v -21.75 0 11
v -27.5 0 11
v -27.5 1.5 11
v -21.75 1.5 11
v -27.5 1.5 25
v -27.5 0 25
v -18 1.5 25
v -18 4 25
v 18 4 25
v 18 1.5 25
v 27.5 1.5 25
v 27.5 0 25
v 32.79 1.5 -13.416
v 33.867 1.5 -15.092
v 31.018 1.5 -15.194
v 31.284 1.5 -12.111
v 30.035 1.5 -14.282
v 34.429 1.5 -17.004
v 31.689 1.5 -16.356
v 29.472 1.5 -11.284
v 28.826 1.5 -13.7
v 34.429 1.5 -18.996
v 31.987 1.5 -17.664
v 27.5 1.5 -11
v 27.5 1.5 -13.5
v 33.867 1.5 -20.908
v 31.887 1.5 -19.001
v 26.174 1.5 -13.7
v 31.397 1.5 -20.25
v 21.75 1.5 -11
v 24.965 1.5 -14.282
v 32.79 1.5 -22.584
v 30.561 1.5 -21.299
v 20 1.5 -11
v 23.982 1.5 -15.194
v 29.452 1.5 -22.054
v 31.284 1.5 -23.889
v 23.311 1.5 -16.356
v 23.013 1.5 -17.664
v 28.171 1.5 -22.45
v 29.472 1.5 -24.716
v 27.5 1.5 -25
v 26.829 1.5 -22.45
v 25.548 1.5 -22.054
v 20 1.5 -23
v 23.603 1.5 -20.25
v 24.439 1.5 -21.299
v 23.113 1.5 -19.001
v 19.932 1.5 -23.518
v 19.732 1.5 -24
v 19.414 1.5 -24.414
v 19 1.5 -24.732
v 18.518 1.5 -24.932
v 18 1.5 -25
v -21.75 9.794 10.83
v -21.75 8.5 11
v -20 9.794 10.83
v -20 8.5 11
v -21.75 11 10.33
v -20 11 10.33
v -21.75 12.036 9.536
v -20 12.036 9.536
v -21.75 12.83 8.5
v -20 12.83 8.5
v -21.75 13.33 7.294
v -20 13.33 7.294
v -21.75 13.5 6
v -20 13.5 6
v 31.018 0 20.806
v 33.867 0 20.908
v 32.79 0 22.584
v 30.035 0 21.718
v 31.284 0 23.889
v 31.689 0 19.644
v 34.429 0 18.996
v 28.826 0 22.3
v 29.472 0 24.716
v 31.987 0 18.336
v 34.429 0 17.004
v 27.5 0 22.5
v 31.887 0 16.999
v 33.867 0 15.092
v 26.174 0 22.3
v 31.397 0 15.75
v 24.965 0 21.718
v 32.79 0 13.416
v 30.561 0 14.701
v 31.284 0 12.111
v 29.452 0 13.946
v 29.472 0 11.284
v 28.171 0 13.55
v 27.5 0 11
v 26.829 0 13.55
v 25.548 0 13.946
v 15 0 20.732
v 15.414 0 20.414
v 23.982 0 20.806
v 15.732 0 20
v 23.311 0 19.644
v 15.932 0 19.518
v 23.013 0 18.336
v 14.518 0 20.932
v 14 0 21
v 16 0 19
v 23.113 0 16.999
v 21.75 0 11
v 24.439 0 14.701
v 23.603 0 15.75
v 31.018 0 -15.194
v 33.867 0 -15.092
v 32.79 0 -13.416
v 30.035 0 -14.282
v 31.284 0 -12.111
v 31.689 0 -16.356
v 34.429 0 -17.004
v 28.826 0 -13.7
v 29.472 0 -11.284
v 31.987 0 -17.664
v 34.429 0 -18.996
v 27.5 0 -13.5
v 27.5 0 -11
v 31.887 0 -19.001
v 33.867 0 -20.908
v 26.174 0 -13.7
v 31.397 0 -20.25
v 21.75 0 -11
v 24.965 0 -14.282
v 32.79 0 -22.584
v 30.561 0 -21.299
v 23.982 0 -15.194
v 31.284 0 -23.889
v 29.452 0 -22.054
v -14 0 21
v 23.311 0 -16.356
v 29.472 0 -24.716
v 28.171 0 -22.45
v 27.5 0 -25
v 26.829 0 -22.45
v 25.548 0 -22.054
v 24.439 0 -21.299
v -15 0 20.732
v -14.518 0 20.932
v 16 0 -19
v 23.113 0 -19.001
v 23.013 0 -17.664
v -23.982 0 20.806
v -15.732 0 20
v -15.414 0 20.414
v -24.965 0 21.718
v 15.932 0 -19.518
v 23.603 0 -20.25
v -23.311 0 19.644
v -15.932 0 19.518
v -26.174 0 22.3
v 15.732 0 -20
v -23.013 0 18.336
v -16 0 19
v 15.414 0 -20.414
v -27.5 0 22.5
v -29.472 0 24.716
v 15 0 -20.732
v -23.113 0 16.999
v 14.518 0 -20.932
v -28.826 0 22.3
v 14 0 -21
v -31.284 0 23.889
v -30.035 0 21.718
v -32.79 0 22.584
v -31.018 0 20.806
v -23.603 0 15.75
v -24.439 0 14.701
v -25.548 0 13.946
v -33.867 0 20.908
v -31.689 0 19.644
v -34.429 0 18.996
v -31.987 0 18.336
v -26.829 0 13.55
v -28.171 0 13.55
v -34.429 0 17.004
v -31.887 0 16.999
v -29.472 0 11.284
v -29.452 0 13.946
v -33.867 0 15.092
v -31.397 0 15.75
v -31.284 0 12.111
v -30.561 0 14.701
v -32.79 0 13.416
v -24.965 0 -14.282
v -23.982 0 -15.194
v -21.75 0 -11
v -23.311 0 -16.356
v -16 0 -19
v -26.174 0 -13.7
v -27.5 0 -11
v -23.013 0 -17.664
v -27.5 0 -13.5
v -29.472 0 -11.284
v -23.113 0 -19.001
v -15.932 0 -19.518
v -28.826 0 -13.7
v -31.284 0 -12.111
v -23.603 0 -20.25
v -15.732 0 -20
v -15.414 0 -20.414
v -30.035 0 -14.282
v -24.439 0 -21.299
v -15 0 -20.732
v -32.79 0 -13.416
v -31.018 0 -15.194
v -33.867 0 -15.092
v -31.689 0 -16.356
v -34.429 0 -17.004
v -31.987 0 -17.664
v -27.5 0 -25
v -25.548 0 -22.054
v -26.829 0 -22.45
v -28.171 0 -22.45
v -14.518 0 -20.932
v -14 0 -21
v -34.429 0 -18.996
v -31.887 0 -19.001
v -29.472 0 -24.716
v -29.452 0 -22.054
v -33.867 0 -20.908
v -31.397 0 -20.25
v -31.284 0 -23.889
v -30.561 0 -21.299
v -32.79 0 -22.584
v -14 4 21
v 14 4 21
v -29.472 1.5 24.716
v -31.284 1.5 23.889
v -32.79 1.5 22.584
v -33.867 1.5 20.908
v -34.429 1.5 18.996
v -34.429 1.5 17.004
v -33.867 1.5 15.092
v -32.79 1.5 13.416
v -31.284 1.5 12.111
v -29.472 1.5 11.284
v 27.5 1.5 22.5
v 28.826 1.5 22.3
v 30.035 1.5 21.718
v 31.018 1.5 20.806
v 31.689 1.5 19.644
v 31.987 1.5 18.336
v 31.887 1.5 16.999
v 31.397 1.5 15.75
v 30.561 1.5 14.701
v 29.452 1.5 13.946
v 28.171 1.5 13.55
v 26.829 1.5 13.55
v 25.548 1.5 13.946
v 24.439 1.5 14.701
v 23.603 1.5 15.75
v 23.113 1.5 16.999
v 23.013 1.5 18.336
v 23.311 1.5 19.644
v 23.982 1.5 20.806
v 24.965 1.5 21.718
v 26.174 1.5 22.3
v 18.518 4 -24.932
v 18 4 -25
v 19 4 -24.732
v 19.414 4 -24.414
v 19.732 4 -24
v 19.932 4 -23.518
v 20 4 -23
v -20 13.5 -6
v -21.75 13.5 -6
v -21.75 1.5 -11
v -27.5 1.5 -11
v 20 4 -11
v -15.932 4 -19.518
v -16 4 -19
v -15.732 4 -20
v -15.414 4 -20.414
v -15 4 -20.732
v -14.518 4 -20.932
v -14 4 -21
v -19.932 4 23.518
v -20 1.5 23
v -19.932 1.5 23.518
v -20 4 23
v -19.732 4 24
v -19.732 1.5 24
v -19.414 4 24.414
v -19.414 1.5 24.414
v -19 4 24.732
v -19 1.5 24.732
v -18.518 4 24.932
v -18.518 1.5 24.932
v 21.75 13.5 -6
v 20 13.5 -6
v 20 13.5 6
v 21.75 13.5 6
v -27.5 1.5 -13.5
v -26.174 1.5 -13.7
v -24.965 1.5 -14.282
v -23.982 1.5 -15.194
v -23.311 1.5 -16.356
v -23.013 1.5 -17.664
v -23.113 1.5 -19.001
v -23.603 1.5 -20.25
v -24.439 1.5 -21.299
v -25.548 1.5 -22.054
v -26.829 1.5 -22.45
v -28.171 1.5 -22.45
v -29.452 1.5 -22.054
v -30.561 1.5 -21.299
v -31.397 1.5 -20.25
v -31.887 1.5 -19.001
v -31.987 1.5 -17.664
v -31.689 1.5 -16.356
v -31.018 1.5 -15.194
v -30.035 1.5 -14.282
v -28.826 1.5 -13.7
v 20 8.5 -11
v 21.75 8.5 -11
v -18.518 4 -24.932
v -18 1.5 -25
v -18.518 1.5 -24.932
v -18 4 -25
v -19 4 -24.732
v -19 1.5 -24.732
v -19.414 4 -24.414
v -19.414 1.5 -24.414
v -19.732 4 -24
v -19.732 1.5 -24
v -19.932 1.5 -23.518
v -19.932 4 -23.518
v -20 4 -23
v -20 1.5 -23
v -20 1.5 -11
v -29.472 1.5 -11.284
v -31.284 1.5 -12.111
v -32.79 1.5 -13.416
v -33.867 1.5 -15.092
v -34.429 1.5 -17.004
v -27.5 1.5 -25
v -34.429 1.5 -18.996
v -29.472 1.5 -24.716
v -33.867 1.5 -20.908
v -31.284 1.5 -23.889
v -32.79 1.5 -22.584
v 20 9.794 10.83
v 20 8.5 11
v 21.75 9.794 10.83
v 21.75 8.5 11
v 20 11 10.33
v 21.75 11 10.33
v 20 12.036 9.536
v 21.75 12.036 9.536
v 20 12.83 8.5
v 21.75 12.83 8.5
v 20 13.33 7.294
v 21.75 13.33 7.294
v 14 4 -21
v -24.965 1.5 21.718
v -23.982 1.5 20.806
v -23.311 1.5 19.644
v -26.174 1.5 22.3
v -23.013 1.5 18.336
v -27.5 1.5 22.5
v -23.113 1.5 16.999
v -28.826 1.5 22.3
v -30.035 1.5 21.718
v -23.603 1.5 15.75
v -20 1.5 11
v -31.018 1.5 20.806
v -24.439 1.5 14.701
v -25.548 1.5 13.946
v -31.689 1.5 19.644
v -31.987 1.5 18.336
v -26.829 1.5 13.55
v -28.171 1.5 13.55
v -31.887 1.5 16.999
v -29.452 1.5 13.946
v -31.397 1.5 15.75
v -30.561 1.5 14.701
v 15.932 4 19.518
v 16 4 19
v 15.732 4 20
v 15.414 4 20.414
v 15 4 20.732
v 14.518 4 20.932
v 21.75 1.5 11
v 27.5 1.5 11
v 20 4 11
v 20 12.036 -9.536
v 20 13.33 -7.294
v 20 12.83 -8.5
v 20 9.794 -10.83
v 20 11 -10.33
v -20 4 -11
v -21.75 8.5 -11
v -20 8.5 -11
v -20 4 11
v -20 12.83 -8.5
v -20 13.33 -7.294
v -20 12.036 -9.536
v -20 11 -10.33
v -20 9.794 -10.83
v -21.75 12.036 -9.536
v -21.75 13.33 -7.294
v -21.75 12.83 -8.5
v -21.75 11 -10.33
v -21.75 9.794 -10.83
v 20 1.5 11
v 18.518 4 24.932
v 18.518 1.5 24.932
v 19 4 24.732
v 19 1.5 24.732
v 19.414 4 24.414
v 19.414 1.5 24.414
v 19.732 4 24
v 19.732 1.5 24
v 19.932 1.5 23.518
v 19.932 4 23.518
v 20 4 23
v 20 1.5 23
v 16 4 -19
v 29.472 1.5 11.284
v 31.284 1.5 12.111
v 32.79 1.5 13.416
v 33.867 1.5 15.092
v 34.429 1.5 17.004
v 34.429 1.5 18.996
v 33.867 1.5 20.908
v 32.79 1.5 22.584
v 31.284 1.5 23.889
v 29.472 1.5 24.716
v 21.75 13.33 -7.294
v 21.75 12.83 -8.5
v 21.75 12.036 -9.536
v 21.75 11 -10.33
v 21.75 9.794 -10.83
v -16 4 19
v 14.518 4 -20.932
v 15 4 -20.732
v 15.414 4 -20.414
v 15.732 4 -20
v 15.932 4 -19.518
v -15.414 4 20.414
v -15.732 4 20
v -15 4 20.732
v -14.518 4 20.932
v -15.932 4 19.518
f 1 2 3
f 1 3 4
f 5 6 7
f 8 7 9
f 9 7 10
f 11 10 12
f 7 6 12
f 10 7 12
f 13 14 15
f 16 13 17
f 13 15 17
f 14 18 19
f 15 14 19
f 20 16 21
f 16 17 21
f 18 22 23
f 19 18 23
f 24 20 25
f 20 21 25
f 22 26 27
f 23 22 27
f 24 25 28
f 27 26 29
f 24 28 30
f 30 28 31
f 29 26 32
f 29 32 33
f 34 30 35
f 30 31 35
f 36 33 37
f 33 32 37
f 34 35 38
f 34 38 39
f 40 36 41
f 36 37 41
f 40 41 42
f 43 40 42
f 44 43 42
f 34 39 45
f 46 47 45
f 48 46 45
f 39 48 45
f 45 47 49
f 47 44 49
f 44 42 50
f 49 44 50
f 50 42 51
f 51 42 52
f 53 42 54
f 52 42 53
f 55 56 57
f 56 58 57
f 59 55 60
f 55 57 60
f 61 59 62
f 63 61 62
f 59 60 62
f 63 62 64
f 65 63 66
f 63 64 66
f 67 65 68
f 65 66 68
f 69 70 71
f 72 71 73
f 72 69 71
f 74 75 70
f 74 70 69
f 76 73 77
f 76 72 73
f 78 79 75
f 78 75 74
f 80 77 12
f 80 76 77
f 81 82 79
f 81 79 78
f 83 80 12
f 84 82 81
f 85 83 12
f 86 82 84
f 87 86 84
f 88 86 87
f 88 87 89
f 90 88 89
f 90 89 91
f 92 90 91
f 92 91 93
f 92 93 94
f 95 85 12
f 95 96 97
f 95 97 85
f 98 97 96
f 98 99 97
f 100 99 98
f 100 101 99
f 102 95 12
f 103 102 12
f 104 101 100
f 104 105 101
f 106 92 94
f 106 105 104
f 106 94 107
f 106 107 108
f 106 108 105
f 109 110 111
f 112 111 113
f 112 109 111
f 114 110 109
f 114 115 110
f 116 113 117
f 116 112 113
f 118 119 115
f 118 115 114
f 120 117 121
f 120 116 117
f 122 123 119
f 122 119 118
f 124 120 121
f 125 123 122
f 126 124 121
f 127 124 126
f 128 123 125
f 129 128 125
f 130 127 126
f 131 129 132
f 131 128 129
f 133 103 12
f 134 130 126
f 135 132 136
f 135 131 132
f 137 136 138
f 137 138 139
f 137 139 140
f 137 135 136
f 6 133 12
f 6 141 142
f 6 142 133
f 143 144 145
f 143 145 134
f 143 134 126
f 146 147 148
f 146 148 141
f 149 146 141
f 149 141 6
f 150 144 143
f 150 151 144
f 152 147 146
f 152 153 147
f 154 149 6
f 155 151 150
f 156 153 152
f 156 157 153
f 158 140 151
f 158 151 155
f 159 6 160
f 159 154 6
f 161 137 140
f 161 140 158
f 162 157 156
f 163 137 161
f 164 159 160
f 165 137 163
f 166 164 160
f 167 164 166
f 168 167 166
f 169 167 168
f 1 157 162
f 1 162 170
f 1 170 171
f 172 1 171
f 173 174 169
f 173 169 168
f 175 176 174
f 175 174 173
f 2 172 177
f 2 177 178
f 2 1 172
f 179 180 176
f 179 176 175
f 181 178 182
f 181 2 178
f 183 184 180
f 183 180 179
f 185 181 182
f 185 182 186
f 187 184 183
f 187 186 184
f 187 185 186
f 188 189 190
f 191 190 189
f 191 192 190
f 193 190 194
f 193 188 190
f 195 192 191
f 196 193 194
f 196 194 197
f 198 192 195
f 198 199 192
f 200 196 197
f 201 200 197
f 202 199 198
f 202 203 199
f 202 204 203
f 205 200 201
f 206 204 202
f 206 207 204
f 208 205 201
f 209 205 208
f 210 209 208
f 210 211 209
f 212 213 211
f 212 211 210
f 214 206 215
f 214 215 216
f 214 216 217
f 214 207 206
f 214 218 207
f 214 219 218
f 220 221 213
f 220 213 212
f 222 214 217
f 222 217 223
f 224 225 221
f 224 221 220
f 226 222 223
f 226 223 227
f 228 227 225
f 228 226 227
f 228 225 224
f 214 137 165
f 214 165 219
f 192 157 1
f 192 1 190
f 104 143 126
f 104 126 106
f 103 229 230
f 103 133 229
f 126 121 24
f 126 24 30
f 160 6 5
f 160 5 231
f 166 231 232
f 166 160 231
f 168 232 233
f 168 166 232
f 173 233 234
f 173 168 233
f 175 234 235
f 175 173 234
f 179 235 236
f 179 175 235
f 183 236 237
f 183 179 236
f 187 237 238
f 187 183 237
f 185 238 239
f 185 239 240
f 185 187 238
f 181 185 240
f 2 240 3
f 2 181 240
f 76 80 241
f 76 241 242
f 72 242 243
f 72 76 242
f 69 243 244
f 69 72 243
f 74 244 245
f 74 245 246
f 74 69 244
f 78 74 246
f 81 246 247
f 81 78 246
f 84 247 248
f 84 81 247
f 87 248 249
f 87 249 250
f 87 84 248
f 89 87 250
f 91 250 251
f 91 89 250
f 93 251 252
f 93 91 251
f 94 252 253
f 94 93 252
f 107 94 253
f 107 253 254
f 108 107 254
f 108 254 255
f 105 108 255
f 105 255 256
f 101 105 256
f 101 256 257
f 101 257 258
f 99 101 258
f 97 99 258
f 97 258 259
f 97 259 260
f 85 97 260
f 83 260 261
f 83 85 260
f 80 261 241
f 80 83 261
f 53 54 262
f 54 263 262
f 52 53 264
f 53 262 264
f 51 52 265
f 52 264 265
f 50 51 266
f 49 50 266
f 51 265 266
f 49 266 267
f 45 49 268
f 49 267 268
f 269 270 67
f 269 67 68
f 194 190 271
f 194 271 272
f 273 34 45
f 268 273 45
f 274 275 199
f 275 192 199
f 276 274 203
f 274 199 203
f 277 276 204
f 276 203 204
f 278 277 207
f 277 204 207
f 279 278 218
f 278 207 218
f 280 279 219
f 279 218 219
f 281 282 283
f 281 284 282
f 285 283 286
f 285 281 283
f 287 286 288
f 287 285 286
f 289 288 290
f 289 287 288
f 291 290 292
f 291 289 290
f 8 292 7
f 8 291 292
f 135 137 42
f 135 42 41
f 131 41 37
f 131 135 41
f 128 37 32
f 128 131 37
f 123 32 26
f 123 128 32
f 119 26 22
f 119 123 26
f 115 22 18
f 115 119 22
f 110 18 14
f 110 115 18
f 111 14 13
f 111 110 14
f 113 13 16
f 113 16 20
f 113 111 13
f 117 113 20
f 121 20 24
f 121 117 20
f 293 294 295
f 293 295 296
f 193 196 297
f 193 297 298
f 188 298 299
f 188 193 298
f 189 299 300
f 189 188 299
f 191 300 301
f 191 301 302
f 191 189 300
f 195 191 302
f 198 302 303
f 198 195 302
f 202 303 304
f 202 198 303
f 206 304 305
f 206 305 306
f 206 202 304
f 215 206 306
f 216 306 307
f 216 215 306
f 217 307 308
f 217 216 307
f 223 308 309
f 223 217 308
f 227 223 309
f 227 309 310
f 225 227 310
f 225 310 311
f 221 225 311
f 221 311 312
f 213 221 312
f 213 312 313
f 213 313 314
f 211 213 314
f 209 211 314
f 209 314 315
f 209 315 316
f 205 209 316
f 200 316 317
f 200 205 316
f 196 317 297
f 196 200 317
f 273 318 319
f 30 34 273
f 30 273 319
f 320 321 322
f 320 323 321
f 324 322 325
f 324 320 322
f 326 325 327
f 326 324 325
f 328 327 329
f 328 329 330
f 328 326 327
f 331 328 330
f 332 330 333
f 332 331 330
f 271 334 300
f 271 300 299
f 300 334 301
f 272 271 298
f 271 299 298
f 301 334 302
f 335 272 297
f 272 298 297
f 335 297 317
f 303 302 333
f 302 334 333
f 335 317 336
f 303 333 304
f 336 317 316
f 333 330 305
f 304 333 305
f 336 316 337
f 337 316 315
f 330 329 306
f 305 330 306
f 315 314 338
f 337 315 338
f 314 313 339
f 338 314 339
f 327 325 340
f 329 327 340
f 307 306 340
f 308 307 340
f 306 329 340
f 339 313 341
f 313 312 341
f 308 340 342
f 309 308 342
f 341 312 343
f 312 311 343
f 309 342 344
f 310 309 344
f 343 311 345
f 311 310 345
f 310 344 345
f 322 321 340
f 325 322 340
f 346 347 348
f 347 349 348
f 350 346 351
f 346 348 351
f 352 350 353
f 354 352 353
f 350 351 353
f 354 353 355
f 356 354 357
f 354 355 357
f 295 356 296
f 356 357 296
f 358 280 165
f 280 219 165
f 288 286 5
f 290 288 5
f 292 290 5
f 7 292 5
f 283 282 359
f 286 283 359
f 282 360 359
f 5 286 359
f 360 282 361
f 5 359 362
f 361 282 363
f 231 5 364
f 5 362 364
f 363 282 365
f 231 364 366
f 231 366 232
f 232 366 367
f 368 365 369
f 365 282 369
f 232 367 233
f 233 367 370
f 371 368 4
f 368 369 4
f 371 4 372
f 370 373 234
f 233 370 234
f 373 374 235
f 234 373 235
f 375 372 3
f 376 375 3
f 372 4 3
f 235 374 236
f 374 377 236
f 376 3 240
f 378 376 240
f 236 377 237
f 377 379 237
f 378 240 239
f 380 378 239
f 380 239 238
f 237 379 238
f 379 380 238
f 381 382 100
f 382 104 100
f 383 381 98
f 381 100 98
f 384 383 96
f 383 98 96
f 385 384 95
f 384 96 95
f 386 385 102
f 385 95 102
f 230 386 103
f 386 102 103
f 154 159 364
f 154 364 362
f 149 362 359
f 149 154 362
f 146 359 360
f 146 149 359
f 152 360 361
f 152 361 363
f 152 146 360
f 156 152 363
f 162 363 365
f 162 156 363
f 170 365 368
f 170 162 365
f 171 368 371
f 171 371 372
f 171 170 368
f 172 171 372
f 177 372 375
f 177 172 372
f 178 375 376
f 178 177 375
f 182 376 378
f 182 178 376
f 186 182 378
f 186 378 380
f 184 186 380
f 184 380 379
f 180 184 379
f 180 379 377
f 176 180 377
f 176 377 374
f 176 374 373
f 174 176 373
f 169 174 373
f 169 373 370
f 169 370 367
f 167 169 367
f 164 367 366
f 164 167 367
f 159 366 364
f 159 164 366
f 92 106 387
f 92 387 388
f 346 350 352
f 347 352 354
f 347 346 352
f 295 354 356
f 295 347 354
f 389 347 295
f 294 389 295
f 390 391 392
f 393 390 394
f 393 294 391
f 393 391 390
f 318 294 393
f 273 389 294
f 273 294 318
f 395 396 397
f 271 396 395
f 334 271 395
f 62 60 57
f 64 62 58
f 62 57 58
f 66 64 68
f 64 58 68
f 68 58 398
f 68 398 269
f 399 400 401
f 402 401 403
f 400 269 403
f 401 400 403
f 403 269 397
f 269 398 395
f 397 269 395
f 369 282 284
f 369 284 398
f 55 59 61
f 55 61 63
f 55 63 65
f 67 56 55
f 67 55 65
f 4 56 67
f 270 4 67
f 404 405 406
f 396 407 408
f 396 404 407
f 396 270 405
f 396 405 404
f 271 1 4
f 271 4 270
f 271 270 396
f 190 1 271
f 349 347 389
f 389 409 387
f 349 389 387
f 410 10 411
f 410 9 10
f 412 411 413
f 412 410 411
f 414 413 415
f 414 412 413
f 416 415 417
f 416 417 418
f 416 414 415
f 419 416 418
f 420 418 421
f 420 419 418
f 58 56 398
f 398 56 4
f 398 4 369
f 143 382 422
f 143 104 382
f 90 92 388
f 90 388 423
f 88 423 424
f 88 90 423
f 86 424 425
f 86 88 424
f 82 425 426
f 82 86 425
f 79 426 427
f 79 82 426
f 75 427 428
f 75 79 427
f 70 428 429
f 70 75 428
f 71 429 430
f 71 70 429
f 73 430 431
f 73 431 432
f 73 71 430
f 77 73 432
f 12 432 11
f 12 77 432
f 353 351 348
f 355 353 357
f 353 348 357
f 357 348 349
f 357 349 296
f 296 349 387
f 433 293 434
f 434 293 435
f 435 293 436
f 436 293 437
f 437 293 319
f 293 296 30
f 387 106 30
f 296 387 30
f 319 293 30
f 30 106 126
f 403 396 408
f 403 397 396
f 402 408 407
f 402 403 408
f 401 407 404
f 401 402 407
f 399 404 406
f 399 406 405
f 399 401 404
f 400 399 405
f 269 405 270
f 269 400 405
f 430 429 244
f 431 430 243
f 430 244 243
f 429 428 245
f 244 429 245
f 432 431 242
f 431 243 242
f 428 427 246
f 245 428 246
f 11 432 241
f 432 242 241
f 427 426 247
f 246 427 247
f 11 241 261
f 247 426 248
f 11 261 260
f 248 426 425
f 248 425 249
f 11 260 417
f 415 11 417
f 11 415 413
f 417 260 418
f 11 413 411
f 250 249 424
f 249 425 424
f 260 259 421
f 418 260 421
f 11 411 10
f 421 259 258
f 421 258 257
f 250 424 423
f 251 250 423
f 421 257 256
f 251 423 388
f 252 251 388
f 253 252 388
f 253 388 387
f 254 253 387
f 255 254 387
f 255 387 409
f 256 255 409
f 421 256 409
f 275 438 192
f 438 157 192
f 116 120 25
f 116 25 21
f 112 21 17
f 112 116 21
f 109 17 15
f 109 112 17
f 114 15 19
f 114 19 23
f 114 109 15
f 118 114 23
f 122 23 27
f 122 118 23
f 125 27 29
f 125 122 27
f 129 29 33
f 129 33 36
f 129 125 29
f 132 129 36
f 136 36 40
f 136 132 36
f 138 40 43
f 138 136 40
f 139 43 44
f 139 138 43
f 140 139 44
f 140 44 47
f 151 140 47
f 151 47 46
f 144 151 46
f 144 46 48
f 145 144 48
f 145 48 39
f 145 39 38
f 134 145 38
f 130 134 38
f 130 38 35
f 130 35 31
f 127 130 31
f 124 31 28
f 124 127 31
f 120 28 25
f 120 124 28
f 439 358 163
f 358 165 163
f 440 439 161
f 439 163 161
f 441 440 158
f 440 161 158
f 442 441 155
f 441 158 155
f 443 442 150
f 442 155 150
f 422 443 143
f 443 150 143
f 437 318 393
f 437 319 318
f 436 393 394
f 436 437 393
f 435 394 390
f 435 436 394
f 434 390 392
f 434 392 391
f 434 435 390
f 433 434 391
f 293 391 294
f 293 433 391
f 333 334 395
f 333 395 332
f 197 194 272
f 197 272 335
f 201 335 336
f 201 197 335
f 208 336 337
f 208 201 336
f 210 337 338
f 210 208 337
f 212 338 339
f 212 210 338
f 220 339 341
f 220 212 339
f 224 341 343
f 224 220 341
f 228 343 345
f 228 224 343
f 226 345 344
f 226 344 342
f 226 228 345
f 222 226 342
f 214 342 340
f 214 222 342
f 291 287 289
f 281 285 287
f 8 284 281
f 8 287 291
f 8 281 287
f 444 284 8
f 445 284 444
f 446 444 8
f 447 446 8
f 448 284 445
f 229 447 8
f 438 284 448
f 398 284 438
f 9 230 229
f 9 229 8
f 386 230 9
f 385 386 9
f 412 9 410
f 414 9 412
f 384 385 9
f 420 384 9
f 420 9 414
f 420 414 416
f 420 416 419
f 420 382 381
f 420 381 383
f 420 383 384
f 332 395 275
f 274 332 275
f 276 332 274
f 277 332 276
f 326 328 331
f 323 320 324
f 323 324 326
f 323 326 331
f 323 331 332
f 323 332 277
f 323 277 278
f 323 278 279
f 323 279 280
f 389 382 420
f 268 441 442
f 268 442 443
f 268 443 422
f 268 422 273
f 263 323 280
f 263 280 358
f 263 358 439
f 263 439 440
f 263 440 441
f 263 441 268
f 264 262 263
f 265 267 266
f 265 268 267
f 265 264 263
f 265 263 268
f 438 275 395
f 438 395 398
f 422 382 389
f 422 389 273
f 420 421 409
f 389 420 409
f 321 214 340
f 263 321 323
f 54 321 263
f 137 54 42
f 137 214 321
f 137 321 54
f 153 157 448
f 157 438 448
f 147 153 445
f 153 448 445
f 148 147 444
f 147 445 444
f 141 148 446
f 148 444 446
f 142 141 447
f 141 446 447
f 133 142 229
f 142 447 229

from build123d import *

# Parameters (mm, degrees)
SKETCH1_R               = 4.5
BOSS_EXTRUDE1_DEPTH     = 1.5
SKETCH2_W               = 1.75
SKETCH2_H               = 22
BOSS_EXTRUDE2_DEPTH     = 12
SKETCH3_W               = 40
SKETCH3_H               = 50
SKETCH3_W_2             = 32
SKETCH3_H_2             = 42
BOSS_EXTRUDE3_DEPTH     = 2.5
CUT_EXTRUDE1_DEPTH      = 45.263416045
CUT_EXTRUDE1_DEPTH_BACK = 45.263416045
SKETCH3_2_W             = 32
SKETCH3_2_H             = 42
FILLET1_R               = 2
FILLET2_R               = 2
FILLET3_R               = 5


with BuildPart() as part:
    # Sketch1 → Boss-Extrude1 (new body)
    with BuildSketch(Plane(origin=(0, 0, 0), x_dir=(1, 0, 0), z_dir=(0, 1, 0))):
        with BuildLine():
            Line((27.5, 25), (-27.5, 25))
            ThreePointArc((-27.5, 25), (-34.5, 18), (-27.5, 11))
            Line((-27.5, 11), (-21.75, 11))
            Line((-21.75, 11), (-21.75, -11))
            Line((-21.75, -11), (-27.5, -11))
            ThreePointArc((-27.5, -11), (-34.5, -18), (-27.5, -25))
            Line((-27.5, -25), (27.5, -25))
            ThreePointArc((27.5, -25), (34.5, -18), (27.5, -11))
            Line((27.5, -11), (21.75, -11))
            Line((21.75, -11), (21.75, 11))
            Line((21.75, 11), (27.5, 11))
            ThreePointArc((27.5, 11), (34.5, 18), (27.5, 25))
        make_face()
        with Locations((-27.5, -18)):
            Circle(SKETCH1_R, mode=Mode.SUBTRACT)
        with Locations((27.5, -18)):
            Circle(SKETCH1_R, mode=Mode.SUBTRACT)
        with Locations((-27.5, 18)):
            Circle(SKETCH1_R, mode=Mode.SUBTRACT)
        with Locations((27.5, 18)):
            Circle(SKETCH1_R, mode=Mode.SUBTRACT)
    extrude(amount=BOSS_EXTRUDE1_DEPTH)

    # Sketch2 → Boss-Extrude2 (add)
    with BuildSketch(Plane(origin=(0, 1.5, 0), x_dir=(1, 0, 0), z_dir=(0, 1, 0))):
        with Locations((-20.875, 0)):
            Rectangle(SKETCH2_W, SKETCH2_H)
        with Locations((20.875, 0)):
            Rectangle(SKETCH2_W, SKETCH2_H)
    extrude(amount=BOSS_EXTRUDE2_DEPTH)

    # Sketch3 → Boss-Extrude3 (add)
    with BuildSketch(Plane(origin=(0, 1.5, 0), x_dir=(1, 0, 0), z_dir=(0, 1, 0))):
        Rectangle(SKETCH3_W, SKETCH3_H)
        Rectangle(SKETCH3_W_2, SKETCH3_H_2, mode=Mode.SUBTRACT)
    extrude(amount=BOSS_EXTRUDE3_DEPTH)

    # Sketch3<2> → Cut-Extrude1 (cut, two sides: drawn at the far end of the back side and taken through both)
    with BuildSketch(Plane(origin=(0, 1.5, 0), x_dir=(1, 0, 0), z_dir=(0, 1, 0)).offset(-CUT_EXTRUDE1_DEPTH_BACK)):
        Rectangle(SKETCH3_2_W, SKETCH3_2_H)
    extrude(amount=CUT_EXTRUDE1_DEPTH + CUT_EXTRUDE1_DEPTH_BACK, mode=Mode.SUBTRACT)

    # Fillet1
    fillet1_edges = [part.edges().sort_by_distance(p)[0] for p in [
        (20, 2.75, -25),
        (20, 2.75, 25),
        (-20, 2.75, 25),
        (-20, 2.75, -25),
    ]]
    fillet(fillet1_edges, radius=FILLET1_R)

    # Fillet2
    fillet2_edges = [part.edges().sort_by_distance(p)[0] for p in [
        (-16, 2, 21),
        (16, 2, 21),
        (16, 2, -21),
        (-16, 2, -21),
    ]]
    fillet(fillet2_edges, radius=FILLET2_R)

    # Fillet3
    fillet3_edges = [part.edges().sort_by_distance(p)[0] for p in [
        (20.875, 13.5, -11),
        (20.875, 13.5, 11),
        (-20.875, 13.5, -11),
        (-20.875, 13.5, 11),
    ]]
    fillet(fillet3_edges, radius=FILLET3_R)


solid = part.part
